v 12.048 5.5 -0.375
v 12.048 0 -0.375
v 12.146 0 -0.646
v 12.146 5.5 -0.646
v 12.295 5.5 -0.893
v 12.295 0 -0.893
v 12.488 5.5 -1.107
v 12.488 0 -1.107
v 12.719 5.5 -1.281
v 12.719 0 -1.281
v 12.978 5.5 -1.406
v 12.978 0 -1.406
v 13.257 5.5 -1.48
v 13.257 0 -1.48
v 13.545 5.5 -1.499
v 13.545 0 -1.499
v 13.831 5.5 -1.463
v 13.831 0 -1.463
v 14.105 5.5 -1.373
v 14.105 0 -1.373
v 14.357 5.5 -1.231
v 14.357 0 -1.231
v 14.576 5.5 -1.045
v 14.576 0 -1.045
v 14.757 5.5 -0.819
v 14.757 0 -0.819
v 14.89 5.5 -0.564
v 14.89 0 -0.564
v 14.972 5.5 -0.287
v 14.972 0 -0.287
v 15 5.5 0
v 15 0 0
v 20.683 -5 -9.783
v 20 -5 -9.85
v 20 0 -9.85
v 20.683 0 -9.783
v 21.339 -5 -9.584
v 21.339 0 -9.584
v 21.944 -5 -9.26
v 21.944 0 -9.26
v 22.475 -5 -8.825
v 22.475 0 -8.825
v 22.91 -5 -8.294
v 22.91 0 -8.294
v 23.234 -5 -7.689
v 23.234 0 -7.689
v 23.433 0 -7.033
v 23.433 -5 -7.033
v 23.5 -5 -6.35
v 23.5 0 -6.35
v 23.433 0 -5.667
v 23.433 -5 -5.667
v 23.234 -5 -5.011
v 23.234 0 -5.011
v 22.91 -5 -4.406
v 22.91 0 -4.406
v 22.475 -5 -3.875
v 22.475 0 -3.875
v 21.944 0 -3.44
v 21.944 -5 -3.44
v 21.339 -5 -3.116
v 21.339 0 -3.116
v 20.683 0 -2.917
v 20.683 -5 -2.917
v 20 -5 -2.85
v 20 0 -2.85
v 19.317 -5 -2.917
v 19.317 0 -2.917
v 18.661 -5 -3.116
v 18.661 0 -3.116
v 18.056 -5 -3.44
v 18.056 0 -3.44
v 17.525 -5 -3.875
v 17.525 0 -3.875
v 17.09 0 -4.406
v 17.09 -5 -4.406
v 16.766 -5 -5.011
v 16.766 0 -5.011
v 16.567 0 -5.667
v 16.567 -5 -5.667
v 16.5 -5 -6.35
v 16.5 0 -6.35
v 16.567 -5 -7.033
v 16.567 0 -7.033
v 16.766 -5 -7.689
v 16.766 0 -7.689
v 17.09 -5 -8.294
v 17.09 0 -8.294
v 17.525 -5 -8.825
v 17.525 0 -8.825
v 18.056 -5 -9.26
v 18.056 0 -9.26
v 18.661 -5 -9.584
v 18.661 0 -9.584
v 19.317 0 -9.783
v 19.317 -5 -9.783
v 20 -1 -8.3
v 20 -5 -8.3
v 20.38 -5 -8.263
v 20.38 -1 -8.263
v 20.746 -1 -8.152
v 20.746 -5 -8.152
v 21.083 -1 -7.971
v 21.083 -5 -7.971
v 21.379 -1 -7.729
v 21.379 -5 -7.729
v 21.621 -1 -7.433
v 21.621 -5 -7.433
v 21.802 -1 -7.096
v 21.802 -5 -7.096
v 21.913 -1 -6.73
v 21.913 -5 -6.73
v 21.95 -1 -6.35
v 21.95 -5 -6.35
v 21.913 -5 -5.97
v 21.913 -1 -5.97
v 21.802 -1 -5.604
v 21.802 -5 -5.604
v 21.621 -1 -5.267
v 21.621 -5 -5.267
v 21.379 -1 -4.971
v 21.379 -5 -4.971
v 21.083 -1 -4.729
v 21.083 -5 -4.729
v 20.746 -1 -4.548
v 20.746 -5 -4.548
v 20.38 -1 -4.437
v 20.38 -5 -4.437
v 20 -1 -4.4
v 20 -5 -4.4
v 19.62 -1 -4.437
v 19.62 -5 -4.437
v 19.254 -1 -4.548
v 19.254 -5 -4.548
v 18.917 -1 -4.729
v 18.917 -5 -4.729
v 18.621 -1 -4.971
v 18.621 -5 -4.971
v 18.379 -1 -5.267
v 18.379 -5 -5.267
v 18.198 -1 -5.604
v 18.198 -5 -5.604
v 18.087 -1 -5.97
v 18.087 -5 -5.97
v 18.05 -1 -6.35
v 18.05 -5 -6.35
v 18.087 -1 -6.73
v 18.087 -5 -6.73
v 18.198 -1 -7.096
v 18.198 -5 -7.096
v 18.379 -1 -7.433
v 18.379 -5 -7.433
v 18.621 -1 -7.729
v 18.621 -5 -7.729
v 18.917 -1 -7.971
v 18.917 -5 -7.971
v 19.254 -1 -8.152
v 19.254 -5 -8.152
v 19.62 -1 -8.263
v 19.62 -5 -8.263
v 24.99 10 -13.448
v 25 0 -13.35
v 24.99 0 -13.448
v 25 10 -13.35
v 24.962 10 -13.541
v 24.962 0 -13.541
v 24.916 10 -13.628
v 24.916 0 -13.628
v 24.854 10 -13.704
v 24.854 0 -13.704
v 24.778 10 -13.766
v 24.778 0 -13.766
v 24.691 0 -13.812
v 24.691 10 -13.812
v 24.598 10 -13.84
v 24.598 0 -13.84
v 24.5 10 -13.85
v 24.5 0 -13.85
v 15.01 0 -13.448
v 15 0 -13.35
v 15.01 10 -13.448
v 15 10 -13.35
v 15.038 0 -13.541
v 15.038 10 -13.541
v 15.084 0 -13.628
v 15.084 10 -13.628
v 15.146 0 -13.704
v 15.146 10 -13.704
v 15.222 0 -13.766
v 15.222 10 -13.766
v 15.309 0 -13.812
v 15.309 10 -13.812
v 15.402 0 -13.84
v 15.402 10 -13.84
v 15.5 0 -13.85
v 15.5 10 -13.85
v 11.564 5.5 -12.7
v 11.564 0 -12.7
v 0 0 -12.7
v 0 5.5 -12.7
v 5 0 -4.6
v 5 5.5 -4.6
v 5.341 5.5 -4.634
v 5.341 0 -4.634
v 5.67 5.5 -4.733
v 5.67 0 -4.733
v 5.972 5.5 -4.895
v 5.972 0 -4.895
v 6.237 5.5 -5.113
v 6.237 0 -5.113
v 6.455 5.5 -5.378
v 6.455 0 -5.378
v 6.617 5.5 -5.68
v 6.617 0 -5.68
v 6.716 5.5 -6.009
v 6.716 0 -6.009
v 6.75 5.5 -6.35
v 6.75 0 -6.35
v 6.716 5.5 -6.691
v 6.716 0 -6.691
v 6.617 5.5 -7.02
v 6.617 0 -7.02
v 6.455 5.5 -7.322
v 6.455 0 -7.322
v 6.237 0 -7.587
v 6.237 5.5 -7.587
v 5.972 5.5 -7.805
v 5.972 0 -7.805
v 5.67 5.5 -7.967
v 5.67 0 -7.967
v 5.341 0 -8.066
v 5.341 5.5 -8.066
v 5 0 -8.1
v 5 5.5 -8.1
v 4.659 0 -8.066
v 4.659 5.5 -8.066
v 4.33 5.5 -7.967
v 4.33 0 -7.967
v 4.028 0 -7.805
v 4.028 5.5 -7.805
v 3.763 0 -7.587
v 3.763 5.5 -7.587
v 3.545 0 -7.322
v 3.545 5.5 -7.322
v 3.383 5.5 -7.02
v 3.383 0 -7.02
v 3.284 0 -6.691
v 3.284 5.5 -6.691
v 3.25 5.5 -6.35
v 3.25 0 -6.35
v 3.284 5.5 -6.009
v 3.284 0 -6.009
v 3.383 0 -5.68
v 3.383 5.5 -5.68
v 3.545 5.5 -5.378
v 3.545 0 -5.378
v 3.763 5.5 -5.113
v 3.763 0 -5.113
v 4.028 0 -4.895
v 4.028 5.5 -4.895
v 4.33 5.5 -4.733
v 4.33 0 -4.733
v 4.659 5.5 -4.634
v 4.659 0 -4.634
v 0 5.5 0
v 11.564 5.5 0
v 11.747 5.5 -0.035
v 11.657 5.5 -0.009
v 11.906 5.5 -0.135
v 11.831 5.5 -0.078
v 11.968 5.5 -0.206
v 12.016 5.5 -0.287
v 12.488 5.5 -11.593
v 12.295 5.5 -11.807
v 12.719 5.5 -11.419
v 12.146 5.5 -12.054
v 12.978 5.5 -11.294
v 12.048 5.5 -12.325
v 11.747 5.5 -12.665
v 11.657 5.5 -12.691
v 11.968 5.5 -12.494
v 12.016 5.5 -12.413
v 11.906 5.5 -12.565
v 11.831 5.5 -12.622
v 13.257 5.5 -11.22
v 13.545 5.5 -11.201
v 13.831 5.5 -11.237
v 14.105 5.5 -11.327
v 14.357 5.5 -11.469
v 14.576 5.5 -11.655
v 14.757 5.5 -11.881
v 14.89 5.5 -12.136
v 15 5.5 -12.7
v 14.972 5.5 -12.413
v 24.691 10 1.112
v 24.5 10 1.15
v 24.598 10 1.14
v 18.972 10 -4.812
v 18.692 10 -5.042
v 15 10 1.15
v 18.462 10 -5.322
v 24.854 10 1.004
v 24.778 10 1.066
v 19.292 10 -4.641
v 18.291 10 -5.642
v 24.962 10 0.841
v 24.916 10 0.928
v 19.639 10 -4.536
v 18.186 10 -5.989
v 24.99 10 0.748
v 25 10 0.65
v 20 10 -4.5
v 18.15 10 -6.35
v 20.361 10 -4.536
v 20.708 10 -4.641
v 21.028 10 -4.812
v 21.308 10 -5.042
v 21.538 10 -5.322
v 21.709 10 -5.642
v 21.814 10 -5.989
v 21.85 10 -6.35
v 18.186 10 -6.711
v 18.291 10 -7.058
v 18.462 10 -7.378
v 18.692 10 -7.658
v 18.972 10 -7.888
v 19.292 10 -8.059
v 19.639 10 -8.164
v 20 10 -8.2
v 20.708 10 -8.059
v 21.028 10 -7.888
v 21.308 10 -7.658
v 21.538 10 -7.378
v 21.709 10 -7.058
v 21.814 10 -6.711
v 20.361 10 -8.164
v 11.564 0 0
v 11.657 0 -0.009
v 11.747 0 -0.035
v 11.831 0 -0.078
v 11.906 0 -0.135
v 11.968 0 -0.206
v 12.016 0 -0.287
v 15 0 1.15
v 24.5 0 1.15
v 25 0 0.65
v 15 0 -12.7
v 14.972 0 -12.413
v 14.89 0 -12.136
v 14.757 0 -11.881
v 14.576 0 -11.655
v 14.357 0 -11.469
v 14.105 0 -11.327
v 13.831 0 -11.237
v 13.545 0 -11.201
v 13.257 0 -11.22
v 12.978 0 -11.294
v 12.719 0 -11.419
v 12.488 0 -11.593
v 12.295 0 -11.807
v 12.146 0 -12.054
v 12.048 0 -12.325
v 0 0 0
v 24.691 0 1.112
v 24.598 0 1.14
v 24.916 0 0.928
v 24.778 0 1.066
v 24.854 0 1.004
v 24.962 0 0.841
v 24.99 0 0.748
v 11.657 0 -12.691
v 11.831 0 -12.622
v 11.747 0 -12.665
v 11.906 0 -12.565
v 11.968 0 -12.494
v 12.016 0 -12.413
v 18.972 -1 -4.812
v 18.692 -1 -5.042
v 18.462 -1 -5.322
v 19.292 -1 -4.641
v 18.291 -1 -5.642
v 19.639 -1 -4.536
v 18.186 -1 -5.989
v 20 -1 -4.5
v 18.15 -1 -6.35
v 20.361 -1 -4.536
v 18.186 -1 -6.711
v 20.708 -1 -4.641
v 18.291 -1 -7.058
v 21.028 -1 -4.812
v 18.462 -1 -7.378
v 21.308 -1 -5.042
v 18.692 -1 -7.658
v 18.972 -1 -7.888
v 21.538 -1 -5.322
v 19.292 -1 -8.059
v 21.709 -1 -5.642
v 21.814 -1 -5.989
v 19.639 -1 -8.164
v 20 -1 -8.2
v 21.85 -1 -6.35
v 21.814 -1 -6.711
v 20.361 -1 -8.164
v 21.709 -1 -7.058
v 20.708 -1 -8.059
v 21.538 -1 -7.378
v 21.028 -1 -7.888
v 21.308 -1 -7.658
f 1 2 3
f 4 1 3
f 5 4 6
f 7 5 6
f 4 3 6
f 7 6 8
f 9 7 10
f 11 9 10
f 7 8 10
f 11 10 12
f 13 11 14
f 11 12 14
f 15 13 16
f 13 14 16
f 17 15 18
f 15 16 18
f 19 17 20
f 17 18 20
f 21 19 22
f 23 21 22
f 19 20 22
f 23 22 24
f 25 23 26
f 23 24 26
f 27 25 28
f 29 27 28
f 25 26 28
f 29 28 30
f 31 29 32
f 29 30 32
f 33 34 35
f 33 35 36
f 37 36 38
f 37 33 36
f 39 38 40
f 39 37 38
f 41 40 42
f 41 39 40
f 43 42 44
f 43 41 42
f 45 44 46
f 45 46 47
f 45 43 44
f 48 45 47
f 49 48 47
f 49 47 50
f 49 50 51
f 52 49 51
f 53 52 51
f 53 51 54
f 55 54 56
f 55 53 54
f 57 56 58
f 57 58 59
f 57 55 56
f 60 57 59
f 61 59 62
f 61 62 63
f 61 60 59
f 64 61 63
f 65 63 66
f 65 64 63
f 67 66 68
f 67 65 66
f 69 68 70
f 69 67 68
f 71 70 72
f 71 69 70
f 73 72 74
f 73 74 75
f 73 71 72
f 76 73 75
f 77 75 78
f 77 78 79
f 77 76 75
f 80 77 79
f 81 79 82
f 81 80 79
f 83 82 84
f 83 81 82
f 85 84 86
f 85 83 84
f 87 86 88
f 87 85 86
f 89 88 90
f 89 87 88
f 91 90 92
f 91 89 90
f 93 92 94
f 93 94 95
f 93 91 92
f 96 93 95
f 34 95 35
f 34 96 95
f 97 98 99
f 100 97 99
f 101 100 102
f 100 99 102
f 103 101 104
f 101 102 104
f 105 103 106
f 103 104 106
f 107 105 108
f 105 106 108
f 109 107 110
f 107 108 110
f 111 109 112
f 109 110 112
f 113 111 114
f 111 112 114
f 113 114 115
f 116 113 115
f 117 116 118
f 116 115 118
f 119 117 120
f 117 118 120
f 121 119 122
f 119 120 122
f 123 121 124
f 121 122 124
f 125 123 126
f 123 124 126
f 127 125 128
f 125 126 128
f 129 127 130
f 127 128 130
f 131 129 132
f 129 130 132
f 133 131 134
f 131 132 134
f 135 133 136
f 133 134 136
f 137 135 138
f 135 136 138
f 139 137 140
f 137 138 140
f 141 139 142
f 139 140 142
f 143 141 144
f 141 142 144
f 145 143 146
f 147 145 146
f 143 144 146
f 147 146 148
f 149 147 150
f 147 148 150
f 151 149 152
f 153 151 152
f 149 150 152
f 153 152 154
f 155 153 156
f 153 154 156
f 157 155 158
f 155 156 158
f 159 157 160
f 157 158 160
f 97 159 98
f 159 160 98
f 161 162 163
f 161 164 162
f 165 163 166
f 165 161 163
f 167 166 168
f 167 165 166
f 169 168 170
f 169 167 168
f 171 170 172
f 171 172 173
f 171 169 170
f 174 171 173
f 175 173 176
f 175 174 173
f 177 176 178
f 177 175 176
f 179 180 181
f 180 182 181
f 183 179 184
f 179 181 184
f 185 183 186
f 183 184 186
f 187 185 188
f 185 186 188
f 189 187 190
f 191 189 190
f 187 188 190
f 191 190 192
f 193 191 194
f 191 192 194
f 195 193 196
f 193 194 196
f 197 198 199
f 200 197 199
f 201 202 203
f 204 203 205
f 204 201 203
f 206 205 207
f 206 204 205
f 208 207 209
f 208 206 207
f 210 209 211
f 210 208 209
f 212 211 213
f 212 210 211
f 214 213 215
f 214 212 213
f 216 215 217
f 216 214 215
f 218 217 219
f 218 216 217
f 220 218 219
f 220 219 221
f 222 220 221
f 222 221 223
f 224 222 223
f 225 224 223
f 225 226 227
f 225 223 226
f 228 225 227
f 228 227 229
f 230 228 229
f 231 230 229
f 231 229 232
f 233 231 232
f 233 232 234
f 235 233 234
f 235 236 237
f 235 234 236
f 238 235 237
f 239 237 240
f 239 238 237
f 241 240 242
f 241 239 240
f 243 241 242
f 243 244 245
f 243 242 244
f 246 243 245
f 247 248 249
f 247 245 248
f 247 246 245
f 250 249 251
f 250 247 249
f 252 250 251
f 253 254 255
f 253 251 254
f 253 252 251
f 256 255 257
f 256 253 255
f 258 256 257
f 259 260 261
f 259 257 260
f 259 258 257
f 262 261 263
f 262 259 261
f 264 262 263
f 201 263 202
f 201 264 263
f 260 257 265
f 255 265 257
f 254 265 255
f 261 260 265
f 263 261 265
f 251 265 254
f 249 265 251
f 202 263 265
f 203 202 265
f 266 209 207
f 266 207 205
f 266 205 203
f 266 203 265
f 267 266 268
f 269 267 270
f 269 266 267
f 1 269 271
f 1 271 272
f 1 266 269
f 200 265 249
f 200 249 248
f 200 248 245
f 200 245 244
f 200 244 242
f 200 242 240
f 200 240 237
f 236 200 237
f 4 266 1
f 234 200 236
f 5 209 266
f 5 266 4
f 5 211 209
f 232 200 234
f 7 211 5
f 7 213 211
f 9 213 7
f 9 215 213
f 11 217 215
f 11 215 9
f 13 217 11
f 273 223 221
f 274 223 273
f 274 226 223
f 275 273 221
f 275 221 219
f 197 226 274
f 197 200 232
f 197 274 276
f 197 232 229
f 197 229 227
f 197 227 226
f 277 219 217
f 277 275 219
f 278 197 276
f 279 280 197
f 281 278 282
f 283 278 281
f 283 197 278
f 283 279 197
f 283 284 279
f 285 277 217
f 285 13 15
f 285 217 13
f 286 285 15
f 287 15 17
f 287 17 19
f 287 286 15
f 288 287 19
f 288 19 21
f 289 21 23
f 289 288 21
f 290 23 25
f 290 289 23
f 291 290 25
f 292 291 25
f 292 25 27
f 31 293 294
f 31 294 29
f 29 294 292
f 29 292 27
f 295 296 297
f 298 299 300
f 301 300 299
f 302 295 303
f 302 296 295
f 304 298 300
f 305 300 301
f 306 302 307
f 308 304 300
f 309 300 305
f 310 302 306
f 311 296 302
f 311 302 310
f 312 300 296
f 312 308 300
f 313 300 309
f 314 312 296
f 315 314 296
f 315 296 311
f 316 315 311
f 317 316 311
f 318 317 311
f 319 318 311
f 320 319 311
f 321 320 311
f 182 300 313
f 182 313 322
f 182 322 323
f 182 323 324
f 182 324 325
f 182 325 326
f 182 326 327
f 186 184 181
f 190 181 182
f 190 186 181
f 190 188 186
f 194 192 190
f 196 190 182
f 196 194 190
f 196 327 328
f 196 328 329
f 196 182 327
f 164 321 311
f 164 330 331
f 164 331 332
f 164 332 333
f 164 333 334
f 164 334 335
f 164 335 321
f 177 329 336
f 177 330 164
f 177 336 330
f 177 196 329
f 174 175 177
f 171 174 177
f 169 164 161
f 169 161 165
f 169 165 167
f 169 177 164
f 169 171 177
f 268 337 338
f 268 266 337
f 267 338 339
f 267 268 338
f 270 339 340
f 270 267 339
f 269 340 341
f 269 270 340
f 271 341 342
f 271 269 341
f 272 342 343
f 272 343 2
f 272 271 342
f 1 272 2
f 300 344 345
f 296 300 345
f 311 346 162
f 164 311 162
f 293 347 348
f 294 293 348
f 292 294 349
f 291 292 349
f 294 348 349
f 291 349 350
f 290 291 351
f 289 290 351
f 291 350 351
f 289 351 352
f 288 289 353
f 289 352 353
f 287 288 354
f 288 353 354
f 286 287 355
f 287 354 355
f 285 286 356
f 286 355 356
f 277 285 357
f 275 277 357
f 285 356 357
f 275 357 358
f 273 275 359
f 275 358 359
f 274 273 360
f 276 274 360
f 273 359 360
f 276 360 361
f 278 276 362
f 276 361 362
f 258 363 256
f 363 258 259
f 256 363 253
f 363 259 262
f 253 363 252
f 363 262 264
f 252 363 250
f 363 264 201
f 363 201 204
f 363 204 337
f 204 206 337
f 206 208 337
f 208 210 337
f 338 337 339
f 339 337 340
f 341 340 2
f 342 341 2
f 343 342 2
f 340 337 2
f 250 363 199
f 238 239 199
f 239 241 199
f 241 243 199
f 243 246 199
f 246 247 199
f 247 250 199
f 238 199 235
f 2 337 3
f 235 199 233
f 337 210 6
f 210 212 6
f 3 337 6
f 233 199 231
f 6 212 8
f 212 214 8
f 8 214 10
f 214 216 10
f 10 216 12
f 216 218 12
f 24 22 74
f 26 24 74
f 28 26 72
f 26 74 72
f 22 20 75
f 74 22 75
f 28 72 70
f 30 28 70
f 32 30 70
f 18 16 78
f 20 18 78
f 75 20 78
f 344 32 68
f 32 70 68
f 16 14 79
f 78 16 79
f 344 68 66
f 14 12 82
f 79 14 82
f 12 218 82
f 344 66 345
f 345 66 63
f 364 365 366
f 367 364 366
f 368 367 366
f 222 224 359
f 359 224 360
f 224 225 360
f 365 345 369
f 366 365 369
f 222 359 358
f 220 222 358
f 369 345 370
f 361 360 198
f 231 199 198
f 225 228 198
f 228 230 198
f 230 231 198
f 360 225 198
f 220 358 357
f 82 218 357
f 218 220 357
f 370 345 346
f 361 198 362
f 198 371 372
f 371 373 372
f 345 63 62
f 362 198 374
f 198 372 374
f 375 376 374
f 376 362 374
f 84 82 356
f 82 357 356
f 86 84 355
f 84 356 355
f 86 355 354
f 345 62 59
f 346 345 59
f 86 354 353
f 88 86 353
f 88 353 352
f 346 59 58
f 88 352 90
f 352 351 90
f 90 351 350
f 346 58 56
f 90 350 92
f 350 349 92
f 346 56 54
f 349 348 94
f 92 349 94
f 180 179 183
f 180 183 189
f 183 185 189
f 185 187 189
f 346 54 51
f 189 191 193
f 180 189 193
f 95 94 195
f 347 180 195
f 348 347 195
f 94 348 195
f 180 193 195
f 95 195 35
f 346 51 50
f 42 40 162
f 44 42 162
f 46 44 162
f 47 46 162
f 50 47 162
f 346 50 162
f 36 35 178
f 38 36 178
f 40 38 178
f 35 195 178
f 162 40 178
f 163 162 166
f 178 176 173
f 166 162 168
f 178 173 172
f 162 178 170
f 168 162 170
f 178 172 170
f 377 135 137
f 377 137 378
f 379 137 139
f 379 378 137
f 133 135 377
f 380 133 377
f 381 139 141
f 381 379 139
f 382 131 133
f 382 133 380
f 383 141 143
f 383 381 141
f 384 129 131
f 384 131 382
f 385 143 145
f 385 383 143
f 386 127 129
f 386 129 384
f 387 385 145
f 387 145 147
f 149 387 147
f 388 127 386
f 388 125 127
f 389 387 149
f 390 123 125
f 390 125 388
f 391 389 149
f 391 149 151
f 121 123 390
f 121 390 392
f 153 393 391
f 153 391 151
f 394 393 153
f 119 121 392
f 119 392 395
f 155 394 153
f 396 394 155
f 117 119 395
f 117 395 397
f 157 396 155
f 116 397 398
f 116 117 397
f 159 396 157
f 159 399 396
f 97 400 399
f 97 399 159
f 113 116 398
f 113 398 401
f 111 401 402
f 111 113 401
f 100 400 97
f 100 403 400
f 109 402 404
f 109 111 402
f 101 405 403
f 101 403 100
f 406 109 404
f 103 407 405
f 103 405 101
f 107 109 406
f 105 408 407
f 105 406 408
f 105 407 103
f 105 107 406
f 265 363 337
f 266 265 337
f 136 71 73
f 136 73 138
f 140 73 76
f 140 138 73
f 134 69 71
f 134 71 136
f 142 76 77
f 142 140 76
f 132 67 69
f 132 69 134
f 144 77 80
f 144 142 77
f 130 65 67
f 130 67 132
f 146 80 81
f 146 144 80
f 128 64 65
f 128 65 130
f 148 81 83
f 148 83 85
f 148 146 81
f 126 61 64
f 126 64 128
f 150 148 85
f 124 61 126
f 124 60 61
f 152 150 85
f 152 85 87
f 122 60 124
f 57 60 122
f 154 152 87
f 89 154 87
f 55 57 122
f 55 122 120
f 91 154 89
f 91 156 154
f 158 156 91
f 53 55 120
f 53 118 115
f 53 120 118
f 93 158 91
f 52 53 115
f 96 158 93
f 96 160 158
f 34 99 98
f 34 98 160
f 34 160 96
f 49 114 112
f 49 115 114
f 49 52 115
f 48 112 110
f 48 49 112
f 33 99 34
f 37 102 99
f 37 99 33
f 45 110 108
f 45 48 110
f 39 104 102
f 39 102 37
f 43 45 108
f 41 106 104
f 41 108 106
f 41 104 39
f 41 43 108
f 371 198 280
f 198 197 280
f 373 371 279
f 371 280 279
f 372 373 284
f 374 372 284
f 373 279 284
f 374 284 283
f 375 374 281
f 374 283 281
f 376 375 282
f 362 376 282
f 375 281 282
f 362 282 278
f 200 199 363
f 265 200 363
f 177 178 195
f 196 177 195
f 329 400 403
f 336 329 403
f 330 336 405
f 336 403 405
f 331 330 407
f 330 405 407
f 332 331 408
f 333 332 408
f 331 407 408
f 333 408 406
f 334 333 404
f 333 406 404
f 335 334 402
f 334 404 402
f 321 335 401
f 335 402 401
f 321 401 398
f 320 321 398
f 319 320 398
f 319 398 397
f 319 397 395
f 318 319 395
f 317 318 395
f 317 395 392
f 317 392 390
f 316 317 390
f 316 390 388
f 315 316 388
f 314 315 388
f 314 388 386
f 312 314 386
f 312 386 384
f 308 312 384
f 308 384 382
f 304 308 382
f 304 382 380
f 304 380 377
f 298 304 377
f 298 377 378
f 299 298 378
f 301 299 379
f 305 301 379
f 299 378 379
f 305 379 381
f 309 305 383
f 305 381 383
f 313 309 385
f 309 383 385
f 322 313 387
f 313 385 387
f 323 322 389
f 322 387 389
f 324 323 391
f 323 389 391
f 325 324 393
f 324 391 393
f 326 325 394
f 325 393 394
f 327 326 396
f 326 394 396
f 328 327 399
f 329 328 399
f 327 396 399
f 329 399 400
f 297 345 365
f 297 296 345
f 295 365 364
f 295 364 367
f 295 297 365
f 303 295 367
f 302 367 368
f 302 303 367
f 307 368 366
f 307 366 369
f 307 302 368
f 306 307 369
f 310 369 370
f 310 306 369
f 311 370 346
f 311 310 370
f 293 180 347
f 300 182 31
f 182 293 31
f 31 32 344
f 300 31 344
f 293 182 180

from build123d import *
from build123d.topology import SkipClean

# Parameters (mm, degrees)
SKETCH1_R           = 1.75
BOSS_EXTRUDE1_DEPTH = 10
SKETCH2_W           = 15
SKETCH2_H           = 12.7
CUT_EXTRUDE1_DEPTH  = 4.5
FILLET1_R           = 0.5
BOSS_EXTRUDE2_START = 5
SKETCH3_R           = 3.5
SKETCH3_R_2         = 1.75
BOSS_EXTRUDE2_DEPTH = 5
SKETCH4_R           = 1.85
CUT_EXTRUDE2_DEPTH  = 33.277275288
SKETCH5_R           = 1.95
CUT_EXTRUDE3_DEPTH  = 4


with BuildPart() as part:
    # Sketch1 → Boss-Extrude1 (new body)
    with BuildSketch(Plane(origin=(0, 0, 0), x_dir=(1, 0, 0), z_dir=(0, 1, 0))):
        with BuildLine():
            Line((0, 0), (12, 0))
            ThreePointArc((12, 0), (13.5, 1.5), (15, 0))
            Line((15, 0), (15, -1.15))
            Line((15, -1.15), (25, -1.15))
            Line((25, -1.15), (25, 13.85))
            Line((25, 13.85), (15, 13.85))
            Line((15, 13.85), (15, 12.7))
            ThreePointArc((15, 12.7), (13.5, 11.2), (12, 12.7))
            Line((12, 12.7), (0, 12.7))
            Line((0, 12.7), (0, 0))
        make_face()
        with Locations(Location((5, 6.35, 0), (0, 0, 270))):
            Circle(SKETCH1_R, mode=Mode.SUBTRACT)
        with Locations(Location((20, 6.35, 0), (0, 0, 270))):
            Circle(SKETCH1_R, mode=Mode.SUBTRACT)
    extrude(amount=BOSS_EXTRUDE1_DEPTH)

    # Sketch2 → Cut-Extrude1 (cut)
    with BuildSketch(Plane(origin=(0, 10, 0), x_dir=(1, 0, 0), z_dir=(0, 1, 0))):
        with Locations((7.5, 6.35)):
            Rectangle(SKETCH2_W, SKETCH2_H)
    extrude(amount=-CUT_EXTRUDE1_DEPTH, mode=Mode.SUBTRACT)

    # Fillet1
    fillet1_edges = [part.edges().sort_by_distance(p)[0] for p in [
        (15, 5, -13.85),
        (25, 5, -13.85),
        (25, 5, 1.15),
        (12, 2.75, -12.7),
        (12, 2.75, 0),
    ]]
    fillet(fillet1_edges, radius=FILLET1_R)

    # Sketch3 → Boss-Extrude2 (add)
    with SkipClean():  # the faces are left unmerged after this step: merging them gives an invalid solid
        with BuildSketch(Plane.XZ.offset(BOSS_EXTRUDE2_START)):
            with Locations(Location((20, -6.35, 0), (0, 0, 270))):
                Circle(SKETCH3_R)
            with Locations(Location((20, -6.35, 0), (0, 0, 270))):
                Circle(SKETCH3_R_2, mode=Mode.SUBTRACT)
        extrude(amount=-BOSS_EXTRUDE2_DEPTH)

    # Sketch4 → Cut-Extrude2 (cut, through all)
    with BuildSketch(Plane.XZ.offset(5)):
        with Locations(Location((20, -6.35, 0), (0, 0, 270))):
            Circle(SKETCH4_R)
    extrude(amount=-CUT_EXTRUDE2_DEPTH, mode=Mode.SUBTRACT)

    # Sketch5 → Cut-Extrude3 (cut)
    with BuildSketch(Plane.XZ.offset(5)):
        with Locations(Location((20, -6.35, 0), (0, 0, 270))):
            Circle(SKETCH5_R)
    extrude(amount=-CUT_EXTRUDE3_DEPTH, mode=Mode.SUBTRACT)


solid = part.part
